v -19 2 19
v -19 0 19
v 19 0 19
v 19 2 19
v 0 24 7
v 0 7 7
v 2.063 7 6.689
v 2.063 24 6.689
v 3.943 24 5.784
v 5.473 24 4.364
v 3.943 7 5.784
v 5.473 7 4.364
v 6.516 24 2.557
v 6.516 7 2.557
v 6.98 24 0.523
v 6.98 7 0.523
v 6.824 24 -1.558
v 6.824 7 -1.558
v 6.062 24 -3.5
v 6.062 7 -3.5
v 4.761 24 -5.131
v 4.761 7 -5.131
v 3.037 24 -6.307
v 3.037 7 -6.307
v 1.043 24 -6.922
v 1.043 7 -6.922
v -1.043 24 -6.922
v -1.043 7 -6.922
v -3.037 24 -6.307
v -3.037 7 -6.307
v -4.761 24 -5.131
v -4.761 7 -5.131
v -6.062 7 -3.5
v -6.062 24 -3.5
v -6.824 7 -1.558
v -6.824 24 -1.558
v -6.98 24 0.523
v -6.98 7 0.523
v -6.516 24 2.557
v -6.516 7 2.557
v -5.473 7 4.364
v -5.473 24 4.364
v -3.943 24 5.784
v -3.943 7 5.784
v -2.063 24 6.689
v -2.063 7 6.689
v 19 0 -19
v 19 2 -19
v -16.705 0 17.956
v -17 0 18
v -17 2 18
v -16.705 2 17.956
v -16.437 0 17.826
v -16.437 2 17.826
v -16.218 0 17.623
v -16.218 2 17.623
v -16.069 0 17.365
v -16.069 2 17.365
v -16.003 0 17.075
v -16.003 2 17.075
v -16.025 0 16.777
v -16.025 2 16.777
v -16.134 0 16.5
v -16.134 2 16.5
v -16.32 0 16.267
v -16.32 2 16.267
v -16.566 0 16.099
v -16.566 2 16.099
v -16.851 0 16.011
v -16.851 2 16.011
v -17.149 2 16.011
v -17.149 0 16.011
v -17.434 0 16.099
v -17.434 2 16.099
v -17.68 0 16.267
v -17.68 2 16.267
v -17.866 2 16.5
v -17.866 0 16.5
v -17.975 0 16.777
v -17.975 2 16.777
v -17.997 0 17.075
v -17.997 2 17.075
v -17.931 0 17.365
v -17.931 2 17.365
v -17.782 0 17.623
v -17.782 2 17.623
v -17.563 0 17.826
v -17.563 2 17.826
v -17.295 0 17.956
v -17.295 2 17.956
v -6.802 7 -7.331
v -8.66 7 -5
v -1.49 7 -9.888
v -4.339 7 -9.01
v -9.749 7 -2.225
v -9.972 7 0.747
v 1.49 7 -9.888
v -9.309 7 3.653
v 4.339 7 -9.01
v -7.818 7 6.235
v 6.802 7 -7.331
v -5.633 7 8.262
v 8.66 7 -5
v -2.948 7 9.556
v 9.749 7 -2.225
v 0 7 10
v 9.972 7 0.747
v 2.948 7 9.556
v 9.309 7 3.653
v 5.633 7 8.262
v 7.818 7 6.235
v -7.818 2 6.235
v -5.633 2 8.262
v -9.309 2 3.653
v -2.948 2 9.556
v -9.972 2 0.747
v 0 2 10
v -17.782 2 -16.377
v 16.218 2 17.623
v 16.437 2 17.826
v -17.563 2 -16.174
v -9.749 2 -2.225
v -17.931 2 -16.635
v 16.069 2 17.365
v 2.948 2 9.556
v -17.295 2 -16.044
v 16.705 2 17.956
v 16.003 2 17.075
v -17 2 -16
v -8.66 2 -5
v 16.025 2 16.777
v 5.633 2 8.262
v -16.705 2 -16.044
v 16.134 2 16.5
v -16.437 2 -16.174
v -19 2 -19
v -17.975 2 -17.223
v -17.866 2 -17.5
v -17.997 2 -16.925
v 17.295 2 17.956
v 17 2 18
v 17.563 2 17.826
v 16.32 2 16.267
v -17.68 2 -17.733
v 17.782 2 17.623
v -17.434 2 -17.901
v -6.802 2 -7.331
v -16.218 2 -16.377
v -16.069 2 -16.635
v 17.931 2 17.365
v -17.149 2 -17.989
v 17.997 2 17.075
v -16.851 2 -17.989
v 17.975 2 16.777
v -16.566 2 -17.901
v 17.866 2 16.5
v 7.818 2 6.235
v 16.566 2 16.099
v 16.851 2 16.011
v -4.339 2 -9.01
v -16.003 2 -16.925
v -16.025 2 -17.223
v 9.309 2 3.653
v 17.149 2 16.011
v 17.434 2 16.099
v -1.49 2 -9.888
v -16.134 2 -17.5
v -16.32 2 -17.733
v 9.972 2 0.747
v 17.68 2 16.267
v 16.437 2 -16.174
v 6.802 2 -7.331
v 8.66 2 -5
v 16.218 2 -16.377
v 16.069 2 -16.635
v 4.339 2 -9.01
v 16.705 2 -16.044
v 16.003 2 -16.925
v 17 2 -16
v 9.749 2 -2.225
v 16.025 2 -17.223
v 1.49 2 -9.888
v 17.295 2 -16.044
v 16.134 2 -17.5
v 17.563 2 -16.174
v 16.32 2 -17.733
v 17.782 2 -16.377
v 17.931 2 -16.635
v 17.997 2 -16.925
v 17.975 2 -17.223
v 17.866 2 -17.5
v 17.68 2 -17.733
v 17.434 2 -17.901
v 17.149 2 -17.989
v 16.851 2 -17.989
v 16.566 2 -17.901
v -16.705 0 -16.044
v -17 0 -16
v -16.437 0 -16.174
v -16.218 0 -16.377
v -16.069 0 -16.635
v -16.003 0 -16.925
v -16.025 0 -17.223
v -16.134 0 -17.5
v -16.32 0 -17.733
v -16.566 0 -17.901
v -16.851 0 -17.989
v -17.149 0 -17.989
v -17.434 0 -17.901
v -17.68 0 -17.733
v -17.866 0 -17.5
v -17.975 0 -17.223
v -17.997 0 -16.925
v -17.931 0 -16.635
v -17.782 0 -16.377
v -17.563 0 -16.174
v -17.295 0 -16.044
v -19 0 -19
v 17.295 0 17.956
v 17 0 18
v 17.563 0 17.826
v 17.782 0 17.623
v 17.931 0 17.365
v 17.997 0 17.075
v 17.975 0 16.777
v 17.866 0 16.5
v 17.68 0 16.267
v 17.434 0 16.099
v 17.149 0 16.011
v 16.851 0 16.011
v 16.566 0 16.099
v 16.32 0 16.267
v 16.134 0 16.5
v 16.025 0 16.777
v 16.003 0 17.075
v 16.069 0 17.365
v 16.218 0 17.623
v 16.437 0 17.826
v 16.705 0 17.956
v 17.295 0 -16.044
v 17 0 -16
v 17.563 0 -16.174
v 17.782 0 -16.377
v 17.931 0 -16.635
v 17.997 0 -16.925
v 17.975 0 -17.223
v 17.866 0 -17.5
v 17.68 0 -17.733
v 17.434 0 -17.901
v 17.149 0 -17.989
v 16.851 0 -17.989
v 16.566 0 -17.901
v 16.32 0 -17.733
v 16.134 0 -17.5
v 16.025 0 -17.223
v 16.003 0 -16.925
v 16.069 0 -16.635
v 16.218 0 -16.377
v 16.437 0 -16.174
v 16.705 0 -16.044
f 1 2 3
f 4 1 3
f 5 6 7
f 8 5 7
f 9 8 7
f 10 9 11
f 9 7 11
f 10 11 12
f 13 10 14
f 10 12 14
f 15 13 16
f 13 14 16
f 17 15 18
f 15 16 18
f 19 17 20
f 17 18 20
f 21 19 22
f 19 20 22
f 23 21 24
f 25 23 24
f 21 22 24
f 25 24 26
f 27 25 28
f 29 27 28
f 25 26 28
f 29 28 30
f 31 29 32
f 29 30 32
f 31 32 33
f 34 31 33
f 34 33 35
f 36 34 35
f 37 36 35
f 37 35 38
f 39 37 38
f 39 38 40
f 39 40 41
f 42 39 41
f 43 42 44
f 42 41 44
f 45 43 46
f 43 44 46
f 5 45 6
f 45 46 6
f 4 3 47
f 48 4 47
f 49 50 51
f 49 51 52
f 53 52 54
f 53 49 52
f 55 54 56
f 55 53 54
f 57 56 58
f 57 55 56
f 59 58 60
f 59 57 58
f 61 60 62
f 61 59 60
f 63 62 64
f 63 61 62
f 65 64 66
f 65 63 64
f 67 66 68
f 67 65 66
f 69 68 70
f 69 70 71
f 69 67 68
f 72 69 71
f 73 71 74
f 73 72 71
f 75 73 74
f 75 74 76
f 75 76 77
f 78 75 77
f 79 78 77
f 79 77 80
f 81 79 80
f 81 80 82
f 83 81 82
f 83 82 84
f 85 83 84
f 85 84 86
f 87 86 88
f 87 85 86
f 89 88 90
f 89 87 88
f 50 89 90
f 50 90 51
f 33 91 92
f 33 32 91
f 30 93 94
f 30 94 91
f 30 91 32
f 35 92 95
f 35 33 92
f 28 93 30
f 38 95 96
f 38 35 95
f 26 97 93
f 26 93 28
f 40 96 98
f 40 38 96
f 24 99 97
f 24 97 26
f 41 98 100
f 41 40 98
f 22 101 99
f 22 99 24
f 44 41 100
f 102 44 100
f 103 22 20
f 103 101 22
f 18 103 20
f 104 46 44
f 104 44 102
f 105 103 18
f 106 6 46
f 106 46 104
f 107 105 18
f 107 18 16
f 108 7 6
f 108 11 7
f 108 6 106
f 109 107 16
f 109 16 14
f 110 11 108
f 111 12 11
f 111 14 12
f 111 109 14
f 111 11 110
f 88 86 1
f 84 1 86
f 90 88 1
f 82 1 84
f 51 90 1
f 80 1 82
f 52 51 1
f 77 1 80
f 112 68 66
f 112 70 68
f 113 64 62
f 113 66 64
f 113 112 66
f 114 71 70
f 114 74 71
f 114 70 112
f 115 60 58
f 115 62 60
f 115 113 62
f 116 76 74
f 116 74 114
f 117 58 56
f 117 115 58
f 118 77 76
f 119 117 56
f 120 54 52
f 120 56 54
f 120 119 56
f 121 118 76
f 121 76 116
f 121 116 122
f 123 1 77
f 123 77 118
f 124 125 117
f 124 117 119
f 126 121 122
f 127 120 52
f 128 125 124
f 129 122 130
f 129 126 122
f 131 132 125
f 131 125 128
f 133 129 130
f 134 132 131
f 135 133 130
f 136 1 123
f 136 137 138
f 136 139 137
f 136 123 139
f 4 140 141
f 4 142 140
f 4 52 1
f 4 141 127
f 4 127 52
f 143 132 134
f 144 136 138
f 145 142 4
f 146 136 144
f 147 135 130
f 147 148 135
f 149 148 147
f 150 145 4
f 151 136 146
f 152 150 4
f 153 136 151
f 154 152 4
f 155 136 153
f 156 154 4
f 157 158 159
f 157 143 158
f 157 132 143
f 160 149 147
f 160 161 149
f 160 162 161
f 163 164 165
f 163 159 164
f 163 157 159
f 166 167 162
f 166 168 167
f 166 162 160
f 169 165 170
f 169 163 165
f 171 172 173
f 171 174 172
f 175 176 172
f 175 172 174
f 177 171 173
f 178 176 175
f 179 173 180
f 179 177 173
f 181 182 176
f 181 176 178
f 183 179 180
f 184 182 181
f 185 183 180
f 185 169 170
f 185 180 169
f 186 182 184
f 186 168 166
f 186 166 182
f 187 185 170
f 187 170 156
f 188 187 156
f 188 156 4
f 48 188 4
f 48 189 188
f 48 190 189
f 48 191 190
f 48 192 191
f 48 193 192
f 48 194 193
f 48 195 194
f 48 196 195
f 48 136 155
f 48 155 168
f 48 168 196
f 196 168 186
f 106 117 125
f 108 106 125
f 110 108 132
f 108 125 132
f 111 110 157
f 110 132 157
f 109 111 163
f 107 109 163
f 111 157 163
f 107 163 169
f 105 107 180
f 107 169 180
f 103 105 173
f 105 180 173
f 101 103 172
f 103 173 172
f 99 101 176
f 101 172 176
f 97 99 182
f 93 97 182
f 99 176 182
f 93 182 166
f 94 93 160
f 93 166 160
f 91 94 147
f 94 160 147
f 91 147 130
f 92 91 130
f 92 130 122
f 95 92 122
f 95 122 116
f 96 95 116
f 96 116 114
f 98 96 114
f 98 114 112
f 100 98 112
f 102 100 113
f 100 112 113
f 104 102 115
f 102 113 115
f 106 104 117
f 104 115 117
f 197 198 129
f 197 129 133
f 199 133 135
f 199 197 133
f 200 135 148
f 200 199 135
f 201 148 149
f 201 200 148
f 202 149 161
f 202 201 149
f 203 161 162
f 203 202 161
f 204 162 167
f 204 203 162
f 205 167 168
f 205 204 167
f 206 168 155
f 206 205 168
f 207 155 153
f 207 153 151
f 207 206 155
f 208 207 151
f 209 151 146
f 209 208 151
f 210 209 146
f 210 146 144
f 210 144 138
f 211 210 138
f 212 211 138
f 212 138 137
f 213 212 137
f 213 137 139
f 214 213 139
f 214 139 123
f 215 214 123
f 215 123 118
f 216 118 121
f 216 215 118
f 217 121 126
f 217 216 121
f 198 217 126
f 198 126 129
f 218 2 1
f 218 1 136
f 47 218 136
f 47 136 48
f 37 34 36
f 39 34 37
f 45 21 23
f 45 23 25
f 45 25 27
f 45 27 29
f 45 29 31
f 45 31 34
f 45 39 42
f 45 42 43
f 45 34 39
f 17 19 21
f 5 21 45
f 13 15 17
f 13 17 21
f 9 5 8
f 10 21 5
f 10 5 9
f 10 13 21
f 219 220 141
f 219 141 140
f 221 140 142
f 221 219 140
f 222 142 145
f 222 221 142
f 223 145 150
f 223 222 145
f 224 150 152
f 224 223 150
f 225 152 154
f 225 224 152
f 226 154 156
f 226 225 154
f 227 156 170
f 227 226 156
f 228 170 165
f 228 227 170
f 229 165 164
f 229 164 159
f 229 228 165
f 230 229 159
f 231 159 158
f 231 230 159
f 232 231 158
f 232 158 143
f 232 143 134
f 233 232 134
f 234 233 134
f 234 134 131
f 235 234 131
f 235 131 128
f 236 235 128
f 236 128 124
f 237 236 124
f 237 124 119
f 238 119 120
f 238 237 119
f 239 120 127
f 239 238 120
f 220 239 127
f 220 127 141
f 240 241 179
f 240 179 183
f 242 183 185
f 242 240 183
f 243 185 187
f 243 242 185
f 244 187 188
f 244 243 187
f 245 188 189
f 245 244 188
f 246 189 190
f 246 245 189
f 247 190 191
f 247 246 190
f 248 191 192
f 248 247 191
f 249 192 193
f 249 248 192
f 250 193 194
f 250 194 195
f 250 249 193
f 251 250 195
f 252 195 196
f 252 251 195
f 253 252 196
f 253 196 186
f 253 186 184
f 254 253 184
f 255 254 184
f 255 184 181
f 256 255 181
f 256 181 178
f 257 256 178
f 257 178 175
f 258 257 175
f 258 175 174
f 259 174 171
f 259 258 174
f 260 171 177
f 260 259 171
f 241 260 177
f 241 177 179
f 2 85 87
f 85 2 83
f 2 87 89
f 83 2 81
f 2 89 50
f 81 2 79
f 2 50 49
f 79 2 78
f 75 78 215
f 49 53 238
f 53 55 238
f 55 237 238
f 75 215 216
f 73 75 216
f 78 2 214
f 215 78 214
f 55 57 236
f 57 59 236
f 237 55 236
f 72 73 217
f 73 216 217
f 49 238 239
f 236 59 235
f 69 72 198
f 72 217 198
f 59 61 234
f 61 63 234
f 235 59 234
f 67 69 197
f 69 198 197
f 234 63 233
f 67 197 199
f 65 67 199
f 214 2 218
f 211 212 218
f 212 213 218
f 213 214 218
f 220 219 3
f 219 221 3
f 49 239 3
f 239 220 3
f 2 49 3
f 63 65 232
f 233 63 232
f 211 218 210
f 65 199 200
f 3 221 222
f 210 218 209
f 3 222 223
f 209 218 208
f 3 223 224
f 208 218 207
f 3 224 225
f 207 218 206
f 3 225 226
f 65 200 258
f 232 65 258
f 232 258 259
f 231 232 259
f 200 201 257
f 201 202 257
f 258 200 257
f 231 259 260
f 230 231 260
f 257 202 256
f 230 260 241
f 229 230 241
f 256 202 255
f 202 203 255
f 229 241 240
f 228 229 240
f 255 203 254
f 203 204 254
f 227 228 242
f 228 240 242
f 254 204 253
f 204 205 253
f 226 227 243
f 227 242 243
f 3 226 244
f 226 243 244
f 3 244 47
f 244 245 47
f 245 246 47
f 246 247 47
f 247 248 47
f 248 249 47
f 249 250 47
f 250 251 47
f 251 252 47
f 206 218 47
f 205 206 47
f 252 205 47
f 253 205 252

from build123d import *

# Parameters (mm, degrees)
SKETCH1_W           = 38
SKETCH1_H           = 38
SKETCH1_R           = 1
BOSS_EXTRUDE1_DEPTH = 2
SKETCH2_R           = 10
BOSS_EXTRUDE2_DEPTH = 5
SKETCH3_R           = 7
BOSS_EXTRUDE3_DEPTH = 17


with BuildPart() as part:
    # Sketch1 → Boss-Extrude1 (new body)
    with BuildSketch(Plane(origin=(0, 0, 0), x_dir=(1, 0, 0), z_dir=(0, 1, 0))):
        Rectangle(SKETCH1_W, SKETCH1_H)
        with Locations(Location((-17, 17, 0), (0, 0, 270))):
            Circle(SKETCH1_R, mode=Mode.SUBTRACT)
        with Locations(Location((17, 17, 0), (0, 0, 270))):
            Circle(SKETCH1_R, mode=Mode.SUBTRACT)
        with Locations(Location((17, -17, 0), (0, 0, 270))):
            Circle(SKETCH1_R, mode=Mode.SUBTRACT)
        with Locations(Location((-17, -17, 0), (0, 0, 270))):
            Circle(SKETCH1_R, mode=Mode.SUBTRACT)
    extrude(amount=BOSS_EXTRUDE1_DEPTH)

    # Sketch2 → Boss-Extrude2 (add)
    with BuildSketch(Plane(origin=(0, 2, 0), x_dir=(1, 0, 0), z_dir=(0, 1, 0))):
        with Locations(Location((0, 0, 0), (0, 0, 270))):
            Circle(SKETCH2_R)
    extrude(amount=BOSS_EXTRUDE2_DEPTH)

    # Sketch3 → Boss-Extrude3 (add)
    with BuildSketch(Plane(origin=(0, 7, 0), x_dir=(1, 0, 0), z_dir=(0, 1, 0))):
        with Locations(Location((0, 0, 0), (0, 0, 270))):
            Circle(SKETCH3_R)
    extrude(amount=BOSS_EXTRUDE3_DEPTH)


solid = part.part
